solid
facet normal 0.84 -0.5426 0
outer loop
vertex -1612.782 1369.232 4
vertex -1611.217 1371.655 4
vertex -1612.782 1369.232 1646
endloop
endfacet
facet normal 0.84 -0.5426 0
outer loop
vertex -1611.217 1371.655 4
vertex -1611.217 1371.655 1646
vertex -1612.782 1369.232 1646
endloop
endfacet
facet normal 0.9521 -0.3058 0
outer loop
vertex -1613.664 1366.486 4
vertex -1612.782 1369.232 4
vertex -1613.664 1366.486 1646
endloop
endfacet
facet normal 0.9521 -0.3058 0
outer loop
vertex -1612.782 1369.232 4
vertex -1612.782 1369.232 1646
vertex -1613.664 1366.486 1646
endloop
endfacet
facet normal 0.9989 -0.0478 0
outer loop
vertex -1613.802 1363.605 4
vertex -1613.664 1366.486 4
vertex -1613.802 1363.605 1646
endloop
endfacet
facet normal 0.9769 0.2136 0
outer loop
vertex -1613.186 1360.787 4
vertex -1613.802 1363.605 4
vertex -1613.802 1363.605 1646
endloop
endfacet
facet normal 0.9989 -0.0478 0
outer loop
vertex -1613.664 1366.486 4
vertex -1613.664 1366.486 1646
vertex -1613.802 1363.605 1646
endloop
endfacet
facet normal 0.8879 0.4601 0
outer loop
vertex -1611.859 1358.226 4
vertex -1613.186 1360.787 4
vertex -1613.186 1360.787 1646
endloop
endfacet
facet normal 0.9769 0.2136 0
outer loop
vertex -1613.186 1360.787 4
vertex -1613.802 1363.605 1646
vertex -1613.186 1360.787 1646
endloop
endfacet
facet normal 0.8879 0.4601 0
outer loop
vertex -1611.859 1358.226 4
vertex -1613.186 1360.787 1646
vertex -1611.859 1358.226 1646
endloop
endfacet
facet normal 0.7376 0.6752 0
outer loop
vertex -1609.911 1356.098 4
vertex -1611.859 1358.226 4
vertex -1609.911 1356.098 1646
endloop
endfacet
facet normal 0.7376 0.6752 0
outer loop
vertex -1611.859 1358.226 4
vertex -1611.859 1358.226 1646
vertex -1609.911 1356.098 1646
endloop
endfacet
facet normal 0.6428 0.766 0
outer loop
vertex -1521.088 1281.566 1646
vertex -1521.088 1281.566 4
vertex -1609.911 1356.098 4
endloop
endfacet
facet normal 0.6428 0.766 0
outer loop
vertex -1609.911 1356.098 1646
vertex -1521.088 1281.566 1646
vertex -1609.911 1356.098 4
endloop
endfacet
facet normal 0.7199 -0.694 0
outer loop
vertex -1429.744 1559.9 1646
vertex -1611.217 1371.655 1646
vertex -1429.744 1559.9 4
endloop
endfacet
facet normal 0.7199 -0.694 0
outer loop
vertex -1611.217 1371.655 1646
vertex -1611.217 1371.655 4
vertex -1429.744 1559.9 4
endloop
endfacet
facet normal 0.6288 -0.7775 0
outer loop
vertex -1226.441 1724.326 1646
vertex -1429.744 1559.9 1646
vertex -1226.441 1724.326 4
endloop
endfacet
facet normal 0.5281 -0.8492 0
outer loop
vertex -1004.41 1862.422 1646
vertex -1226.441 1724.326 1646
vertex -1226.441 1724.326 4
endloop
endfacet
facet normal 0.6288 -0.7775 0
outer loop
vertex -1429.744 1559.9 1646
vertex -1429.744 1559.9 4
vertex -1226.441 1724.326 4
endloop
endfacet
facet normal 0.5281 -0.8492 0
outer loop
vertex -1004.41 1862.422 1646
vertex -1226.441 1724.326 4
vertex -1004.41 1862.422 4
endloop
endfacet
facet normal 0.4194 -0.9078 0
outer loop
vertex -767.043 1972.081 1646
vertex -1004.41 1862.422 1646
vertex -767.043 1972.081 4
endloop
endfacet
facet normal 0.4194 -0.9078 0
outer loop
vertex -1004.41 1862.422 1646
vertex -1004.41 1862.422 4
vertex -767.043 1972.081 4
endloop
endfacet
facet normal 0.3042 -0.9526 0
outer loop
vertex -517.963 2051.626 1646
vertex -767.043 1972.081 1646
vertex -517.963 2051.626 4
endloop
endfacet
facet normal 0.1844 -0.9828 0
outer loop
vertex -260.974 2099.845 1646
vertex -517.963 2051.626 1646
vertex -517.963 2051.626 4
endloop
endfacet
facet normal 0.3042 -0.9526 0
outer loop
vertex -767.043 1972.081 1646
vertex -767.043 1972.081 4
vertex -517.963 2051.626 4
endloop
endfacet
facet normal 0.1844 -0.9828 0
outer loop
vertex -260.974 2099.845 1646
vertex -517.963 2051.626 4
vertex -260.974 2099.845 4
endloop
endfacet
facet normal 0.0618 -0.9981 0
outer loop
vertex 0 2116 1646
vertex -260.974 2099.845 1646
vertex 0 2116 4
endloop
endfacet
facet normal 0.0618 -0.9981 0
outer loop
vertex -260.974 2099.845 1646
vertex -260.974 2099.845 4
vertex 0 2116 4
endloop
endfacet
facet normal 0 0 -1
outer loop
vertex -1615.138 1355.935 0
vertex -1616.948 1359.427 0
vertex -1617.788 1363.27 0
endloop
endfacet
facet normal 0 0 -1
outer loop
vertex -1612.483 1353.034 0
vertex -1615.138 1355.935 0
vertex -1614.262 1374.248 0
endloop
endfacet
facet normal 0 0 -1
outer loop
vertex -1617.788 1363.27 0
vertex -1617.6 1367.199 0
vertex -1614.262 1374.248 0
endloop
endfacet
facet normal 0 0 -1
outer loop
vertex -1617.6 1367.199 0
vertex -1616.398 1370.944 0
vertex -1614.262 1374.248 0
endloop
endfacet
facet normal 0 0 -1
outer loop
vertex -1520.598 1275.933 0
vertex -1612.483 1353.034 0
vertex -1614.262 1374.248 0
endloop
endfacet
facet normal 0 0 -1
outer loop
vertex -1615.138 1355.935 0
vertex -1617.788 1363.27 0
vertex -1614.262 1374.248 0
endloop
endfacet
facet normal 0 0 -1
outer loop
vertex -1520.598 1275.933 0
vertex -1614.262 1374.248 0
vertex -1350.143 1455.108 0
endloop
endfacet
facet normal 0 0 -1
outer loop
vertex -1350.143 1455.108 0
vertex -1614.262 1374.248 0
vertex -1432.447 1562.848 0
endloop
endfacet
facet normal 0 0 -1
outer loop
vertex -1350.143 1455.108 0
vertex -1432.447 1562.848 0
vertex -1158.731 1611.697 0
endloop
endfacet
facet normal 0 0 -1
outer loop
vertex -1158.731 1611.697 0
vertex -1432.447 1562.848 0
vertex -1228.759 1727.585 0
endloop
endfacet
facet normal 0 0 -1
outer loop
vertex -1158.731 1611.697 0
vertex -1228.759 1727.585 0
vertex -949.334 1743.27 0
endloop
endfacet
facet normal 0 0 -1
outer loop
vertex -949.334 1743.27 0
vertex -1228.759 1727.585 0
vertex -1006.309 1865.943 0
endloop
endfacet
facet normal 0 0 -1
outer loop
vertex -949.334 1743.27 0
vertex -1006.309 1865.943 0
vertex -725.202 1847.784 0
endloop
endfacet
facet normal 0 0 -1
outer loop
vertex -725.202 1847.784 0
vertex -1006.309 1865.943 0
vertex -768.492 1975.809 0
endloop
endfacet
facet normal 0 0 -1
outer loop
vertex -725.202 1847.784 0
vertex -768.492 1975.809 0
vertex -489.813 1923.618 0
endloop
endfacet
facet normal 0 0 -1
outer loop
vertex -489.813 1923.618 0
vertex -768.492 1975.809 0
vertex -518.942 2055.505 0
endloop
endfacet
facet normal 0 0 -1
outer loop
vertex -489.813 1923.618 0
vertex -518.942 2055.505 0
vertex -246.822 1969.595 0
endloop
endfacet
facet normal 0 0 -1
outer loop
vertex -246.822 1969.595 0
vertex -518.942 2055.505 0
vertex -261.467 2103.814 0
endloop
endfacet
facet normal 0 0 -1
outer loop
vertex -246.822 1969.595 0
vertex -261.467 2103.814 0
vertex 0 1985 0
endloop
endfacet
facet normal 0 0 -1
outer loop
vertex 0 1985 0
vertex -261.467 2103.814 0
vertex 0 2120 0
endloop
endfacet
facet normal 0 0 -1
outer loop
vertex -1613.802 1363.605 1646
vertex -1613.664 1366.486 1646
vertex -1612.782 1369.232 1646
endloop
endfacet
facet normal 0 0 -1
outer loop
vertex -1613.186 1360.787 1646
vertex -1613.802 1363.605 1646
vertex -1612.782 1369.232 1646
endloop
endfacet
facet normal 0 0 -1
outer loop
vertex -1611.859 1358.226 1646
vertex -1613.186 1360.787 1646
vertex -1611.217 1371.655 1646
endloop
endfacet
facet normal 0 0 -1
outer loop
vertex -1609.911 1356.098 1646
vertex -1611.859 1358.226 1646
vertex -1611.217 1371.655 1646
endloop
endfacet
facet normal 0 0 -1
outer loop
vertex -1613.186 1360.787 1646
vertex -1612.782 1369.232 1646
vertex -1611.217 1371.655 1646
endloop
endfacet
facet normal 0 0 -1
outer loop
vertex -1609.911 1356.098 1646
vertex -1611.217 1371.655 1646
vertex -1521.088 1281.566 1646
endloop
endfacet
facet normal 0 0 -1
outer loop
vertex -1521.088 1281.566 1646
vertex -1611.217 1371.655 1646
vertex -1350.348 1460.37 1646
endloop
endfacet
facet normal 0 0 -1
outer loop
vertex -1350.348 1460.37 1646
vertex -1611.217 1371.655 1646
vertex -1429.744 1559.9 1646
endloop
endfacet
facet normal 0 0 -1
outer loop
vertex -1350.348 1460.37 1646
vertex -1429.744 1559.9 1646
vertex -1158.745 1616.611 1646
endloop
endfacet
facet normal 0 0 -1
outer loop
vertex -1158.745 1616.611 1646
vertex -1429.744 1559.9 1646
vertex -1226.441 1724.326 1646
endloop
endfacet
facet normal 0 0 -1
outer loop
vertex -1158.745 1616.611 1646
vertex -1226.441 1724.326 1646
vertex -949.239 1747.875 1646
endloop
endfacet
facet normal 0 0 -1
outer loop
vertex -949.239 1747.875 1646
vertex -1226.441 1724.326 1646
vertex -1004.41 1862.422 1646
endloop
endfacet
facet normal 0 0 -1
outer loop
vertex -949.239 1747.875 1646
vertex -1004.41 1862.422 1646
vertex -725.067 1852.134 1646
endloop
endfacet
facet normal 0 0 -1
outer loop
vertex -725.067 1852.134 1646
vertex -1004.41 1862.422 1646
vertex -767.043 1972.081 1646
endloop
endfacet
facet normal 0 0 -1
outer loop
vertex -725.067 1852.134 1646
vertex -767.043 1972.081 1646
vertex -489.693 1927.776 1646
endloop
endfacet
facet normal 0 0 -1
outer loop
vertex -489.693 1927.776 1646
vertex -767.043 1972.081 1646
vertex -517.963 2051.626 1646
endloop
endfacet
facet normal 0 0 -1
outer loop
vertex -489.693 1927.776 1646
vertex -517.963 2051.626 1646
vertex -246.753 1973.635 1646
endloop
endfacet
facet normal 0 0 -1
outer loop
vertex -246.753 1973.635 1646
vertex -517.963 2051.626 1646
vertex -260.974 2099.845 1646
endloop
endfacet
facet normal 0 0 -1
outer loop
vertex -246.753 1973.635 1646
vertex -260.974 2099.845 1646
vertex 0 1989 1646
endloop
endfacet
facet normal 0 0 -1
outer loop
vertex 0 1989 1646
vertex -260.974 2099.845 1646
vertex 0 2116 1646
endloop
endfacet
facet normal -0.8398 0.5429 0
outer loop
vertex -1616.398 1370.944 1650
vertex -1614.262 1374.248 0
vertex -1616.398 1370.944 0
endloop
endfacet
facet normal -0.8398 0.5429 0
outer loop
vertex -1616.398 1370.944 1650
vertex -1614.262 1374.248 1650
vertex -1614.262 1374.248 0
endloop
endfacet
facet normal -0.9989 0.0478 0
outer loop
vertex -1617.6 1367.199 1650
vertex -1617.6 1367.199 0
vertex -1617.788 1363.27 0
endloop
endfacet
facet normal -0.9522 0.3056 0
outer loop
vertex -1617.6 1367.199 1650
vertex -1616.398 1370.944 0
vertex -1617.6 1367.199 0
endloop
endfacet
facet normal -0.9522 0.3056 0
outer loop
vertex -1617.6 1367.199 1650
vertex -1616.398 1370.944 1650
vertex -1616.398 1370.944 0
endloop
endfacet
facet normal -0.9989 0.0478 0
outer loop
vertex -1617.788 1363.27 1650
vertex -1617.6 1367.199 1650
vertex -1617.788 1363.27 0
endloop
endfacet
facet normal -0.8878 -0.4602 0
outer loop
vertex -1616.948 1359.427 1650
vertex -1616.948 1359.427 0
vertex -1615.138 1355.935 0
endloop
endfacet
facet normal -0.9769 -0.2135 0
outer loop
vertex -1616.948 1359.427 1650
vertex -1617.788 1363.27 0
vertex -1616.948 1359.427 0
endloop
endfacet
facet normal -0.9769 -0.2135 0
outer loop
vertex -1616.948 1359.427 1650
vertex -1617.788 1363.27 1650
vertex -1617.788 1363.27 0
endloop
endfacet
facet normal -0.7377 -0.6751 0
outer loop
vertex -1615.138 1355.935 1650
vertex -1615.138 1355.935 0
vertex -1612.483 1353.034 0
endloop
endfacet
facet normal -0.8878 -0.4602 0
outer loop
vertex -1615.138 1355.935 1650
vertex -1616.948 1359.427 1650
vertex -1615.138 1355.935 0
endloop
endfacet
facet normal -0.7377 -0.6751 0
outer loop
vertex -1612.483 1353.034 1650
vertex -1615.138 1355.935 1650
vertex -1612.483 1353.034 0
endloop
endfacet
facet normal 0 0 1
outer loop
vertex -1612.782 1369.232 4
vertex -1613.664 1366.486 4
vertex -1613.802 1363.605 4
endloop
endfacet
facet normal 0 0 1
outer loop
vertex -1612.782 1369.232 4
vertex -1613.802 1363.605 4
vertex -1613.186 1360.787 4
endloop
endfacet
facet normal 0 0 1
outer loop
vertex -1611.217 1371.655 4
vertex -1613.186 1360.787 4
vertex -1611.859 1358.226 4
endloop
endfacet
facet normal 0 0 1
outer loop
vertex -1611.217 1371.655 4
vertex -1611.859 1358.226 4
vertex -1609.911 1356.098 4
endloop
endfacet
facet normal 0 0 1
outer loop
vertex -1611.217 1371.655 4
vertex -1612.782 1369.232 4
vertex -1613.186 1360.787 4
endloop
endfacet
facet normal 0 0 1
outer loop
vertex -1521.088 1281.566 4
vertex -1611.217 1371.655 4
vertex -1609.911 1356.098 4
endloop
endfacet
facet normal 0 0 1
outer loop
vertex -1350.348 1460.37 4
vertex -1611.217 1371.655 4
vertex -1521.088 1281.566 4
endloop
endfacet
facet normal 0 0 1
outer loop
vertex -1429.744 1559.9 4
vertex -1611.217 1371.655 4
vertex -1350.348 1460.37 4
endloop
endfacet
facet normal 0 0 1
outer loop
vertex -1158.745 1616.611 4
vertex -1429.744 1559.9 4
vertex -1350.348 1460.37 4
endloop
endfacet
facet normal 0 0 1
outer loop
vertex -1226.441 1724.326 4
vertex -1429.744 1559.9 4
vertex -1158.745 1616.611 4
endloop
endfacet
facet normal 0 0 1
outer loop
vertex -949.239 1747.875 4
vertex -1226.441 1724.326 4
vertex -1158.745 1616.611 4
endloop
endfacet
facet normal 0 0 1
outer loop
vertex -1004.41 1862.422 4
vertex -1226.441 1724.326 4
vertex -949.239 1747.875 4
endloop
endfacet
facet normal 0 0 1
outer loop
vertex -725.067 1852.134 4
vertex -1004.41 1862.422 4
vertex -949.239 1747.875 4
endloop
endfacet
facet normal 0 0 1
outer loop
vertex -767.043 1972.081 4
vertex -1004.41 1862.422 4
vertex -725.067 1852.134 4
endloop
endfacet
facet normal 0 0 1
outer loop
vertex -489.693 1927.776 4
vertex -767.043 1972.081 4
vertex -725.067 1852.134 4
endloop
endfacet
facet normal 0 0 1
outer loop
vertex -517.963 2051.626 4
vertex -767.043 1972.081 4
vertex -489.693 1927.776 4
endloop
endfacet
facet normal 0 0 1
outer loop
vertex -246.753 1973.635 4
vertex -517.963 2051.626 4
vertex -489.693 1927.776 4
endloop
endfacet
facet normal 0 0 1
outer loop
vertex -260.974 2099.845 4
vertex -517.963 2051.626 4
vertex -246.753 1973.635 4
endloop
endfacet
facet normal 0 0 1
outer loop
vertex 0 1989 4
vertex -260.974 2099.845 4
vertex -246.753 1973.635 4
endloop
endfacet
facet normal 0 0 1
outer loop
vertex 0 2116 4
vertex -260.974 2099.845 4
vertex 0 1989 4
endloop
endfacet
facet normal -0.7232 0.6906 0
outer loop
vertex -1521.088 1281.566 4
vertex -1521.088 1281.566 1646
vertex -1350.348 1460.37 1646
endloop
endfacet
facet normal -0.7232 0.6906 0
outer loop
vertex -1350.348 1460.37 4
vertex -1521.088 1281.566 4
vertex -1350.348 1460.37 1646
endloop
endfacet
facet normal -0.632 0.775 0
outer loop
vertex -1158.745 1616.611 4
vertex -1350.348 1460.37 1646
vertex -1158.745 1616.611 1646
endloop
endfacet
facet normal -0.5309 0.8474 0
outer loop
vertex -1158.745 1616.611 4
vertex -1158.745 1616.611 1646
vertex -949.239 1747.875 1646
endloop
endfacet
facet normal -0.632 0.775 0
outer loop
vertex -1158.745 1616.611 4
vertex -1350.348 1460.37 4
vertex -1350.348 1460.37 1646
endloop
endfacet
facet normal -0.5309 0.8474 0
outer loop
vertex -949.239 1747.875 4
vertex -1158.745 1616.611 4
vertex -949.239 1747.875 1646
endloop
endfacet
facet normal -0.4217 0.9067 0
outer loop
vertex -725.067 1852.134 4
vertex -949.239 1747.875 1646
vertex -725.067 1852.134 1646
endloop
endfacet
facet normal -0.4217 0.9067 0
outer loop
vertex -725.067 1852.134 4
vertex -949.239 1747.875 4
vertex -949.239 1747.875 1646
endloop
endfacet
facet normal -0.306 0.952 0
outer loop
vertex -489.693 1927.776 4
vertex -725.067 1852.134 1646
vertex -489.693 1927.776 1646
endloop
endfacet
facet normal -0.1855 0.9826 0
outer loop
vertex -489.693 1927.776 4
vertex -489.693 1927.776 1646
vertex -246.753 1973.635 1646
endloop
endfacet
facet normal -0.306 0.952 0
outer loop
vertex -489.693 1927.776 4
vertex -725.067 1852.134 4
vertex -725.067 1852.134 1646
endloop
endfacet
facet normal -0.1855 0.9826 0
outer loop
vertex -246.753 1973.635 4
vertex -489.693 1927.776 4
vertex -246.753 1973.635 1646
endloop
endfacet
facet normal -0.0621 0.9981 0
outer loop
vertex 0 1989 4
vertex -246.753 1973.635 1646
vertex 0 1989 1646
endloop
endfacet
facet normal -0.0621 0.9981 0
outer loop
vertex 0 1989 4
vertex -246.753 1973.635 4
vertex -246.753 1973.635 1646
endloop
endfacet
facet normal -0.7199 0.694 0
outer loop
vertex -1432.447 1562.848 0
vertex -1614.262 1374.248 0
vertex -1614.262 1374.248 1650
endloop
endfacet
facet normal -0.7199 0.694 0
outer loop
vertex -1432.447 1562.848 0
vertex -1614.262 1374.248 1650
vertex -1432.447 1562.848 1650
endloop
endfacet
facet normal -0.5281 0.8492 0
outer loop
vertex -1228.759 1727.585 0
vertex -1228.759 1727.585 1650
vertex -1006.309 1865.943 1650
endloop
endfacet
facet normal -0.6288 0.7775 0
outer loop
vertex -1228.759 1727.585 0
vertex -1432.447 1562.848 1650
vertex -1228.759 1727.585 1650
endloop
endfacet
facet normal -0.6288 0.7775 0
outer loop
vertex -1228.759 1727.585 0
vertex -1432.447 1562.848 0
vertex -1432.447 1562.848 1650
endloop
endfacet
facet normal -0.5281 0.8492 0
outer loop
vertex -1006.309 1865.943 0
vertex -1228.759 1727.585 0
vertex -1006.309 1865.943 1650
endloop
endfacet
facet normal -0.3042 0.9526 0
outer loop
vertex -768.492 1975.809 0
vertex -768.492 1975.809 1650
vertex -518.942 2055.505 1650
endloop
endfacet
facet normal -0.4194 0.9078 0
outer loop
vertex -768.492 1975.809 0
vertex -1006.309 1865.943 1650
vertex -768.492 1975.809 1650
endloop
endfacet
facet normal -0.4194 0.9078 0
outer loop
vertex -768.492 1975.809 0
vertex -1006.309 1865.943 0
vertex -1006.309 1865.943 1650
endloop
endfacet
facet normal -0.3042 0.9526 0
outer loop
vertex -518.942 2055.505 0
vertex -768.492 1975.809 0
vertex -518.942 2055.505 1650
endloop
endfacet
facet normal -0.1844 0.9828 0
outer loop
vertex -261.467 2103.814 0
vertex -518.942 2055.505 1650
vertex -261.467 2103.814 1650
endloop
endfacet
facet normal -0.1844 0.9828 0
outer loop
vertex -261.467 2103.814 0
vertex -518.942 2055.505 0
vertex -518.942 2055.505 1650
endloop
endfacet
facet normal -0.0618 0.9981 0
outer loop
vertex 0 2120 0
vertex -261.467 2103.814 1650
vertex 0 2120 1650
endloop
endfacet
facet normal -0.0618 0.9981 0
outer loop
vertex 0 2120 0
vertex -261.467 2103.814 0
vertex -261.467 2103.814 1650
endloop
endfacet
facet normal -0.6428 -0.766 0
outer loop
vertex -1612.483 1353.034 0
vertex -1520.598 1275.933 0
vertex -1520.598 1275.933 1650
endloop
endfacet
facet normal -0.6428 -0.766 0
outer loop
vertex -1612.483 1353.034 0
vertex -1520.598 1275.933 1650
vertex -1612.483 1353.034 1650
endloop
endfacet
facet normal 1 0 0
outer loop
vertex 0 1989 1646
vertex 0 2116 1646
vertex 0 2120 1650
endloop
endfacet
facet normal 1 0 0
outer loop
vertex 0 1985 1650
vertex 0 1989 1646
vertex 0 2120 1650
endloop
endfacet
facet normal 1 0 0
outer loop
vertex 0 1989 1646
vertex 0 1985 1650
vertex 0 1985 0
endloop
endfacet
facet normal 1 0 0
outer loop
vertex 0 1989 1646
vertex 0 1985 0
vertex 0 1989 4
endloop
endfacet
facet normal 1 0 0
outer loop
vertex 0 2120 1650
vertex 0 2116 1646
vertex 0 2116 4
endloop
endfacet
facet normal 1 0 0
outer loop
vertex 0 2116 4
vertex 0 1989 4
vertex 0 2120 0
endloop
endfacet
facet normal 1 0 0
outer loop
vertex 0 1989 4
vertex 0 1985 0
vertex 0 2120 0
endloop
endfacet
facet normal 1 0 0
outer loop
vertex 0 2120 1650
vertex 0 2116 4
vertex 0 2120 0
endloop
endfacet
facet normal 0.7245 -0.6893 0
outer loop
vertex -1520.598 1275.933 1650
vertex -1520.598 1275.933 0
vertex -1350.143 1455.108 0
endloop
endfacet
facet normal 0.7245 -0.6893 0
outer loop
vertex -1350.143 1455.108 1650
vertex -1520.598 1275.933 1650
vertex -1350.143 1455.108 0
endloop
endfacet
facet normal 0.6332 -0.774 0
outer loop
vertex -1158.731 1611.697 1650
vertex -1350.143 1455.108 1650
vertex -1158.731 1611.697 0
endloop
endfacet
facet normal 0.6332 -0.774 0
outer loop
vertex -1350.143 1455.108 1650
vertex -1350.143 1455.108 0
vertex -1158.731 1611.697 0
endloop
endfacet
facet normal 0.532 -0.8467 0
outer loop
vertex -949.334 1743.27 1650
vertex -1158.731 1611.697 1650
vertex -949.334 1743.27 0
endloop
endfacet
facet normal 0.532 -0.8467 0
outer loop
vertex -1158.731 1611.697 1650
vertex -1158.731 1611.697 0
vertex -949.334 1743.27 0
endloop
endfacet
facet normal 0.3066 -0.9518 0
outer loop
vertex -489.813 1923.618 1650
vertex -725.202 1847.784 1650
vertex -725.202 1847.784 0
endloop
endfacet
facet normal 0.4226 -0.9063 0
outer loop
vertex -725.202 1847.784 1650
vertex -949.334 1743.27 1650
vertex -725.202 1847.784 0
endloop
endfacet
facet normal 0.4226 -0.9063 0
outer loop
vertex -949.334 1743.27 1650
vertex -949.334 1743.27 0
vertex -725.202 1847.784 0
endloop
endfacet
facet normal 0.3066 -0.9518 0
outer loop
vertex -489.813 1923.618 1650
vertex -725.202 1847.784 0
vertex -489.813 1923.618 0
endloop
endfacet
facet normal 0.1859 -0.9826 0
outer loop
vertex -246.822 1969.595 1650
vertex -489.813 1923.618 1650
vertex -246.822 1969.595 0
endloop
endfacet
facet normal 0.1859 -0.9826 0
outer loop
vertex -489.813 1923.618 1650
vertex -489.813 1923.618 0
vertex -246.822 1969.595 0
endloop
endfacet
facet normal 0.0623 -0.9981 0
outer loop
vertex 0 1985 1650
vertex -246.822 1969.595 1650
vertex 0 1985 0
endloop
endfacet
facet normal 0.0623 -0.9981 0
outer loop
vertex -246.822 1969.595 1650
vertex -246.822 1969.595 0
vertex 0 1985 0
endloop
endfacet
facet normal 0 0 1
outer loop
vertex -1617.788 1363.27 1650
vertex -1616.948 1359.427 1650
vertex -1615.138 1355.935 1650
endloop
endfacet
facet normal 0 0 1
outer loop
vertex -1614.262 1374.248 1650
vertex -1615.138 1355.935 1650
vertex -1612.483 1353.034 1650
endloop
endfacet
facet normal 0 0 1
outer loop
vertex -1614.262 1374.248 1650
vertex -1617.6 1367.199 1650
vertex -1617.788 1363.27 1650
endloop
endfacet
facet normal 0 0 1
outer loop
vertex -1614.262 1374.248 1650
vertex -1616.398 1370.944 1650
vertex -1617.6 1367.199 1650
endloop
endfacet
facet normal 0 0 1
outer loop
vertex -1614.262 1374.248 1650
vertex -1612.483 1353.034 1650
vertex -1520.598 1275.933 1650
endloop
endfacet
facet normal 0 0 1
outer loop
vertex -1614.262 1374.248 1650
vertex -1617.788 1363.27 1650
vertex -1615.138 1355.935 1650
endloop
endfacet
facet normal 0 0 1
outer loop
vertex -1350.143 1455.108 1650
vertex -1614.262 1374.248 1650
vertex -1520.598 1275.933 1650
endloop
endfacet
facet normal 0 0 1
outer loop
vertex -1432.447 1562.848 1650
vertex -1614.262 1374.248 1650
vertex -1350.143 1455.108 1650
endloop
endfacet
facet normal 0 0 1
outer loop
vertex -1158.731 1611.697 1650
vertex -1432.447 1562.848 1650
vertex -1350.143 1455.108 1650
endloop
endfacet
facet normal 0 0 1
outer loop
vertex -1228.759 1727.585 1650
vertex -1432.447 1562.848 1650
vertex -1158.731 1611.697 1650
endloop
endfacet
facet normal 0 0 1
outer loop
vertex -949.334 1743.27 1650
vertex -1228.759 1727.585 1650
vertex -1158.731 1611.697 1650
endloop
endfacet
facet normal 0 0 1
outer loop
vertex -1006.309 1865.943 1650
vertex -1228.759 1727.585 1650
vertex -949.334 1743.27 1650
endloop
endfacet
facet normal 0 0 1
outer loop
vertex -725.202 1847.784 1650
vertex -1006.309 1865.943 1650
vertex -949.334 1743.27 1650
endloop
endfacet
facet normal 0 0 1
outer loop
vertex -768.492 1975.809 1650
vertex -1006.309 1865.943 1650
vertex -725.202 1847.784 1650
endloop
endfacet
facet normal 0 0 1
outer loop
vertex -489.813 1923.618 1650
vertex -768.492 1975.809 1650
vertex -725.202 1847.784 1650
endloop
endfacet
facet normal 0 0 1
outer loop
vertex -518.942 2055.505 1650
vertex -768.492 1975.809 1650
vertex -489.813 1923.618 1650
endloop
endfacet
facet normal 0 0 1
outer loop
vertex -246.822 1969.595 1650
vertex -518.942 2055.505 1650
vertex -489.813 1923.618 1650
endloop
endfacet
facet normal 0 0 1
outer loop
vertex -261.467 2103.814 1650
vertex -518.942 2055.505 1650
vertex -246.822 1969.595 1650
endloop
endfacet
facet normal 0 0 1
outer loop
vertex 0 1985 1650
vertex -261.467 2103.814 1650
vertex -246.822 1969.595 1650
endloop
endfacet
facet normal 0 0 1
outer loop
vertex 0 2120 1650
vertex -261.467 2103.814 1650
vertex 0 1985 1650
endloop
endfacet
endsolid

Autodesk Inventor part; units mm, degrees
ref_plane "YZ Plane" through (0, 0, 0) normal (1, 0, 0) x (0, 1, 0)
ref_plane "XY Plane" through (0, 0, 0) normal (0, 0, 1) x (1, 0, 0)
sketch "Sketch1" plane through (0, 0, 0) normal (0, 0, 1) x (1, 0, 0)
  arc A0 (0, 2120) -> (-1624.0142, 1362.7097) centre (0, 0) ccw
  line L0 (0, 1985) -> (0, 2120)
  line L1 (0, 0) -> (2120, 0) construction
  line L2 (-1520.5982, 1275.9334) -> (-1624.0142, 1362.7097)
  line L3 (0, 0) -> (2120, 0) construction
  arc A1 (0, 1985) -> (-1520.5982, 1275.9334) centre (0, 0) ccw
  dimension "d0" = 4240
  dimension "d1" = 90
  dimension "d2" = 140
  dimension "d5" = 1985
extrude "Extrusion1" add sketch "Sketch1" along normal blind 1650
ref_plane "Work Plane1" through (-1520.5982, 1275.9334, 0) normal (0, 1, 0) x (0, 0, 1)
fillet "Fillet1" radius 15 1 edges at (-1624.0142, 1362.7097, 825)
shell "Shell2" thickness 4 removed faces 1 at (0, 2030, 550)
properties part number "Water Tank" material "Polycarbonate, Clear"
